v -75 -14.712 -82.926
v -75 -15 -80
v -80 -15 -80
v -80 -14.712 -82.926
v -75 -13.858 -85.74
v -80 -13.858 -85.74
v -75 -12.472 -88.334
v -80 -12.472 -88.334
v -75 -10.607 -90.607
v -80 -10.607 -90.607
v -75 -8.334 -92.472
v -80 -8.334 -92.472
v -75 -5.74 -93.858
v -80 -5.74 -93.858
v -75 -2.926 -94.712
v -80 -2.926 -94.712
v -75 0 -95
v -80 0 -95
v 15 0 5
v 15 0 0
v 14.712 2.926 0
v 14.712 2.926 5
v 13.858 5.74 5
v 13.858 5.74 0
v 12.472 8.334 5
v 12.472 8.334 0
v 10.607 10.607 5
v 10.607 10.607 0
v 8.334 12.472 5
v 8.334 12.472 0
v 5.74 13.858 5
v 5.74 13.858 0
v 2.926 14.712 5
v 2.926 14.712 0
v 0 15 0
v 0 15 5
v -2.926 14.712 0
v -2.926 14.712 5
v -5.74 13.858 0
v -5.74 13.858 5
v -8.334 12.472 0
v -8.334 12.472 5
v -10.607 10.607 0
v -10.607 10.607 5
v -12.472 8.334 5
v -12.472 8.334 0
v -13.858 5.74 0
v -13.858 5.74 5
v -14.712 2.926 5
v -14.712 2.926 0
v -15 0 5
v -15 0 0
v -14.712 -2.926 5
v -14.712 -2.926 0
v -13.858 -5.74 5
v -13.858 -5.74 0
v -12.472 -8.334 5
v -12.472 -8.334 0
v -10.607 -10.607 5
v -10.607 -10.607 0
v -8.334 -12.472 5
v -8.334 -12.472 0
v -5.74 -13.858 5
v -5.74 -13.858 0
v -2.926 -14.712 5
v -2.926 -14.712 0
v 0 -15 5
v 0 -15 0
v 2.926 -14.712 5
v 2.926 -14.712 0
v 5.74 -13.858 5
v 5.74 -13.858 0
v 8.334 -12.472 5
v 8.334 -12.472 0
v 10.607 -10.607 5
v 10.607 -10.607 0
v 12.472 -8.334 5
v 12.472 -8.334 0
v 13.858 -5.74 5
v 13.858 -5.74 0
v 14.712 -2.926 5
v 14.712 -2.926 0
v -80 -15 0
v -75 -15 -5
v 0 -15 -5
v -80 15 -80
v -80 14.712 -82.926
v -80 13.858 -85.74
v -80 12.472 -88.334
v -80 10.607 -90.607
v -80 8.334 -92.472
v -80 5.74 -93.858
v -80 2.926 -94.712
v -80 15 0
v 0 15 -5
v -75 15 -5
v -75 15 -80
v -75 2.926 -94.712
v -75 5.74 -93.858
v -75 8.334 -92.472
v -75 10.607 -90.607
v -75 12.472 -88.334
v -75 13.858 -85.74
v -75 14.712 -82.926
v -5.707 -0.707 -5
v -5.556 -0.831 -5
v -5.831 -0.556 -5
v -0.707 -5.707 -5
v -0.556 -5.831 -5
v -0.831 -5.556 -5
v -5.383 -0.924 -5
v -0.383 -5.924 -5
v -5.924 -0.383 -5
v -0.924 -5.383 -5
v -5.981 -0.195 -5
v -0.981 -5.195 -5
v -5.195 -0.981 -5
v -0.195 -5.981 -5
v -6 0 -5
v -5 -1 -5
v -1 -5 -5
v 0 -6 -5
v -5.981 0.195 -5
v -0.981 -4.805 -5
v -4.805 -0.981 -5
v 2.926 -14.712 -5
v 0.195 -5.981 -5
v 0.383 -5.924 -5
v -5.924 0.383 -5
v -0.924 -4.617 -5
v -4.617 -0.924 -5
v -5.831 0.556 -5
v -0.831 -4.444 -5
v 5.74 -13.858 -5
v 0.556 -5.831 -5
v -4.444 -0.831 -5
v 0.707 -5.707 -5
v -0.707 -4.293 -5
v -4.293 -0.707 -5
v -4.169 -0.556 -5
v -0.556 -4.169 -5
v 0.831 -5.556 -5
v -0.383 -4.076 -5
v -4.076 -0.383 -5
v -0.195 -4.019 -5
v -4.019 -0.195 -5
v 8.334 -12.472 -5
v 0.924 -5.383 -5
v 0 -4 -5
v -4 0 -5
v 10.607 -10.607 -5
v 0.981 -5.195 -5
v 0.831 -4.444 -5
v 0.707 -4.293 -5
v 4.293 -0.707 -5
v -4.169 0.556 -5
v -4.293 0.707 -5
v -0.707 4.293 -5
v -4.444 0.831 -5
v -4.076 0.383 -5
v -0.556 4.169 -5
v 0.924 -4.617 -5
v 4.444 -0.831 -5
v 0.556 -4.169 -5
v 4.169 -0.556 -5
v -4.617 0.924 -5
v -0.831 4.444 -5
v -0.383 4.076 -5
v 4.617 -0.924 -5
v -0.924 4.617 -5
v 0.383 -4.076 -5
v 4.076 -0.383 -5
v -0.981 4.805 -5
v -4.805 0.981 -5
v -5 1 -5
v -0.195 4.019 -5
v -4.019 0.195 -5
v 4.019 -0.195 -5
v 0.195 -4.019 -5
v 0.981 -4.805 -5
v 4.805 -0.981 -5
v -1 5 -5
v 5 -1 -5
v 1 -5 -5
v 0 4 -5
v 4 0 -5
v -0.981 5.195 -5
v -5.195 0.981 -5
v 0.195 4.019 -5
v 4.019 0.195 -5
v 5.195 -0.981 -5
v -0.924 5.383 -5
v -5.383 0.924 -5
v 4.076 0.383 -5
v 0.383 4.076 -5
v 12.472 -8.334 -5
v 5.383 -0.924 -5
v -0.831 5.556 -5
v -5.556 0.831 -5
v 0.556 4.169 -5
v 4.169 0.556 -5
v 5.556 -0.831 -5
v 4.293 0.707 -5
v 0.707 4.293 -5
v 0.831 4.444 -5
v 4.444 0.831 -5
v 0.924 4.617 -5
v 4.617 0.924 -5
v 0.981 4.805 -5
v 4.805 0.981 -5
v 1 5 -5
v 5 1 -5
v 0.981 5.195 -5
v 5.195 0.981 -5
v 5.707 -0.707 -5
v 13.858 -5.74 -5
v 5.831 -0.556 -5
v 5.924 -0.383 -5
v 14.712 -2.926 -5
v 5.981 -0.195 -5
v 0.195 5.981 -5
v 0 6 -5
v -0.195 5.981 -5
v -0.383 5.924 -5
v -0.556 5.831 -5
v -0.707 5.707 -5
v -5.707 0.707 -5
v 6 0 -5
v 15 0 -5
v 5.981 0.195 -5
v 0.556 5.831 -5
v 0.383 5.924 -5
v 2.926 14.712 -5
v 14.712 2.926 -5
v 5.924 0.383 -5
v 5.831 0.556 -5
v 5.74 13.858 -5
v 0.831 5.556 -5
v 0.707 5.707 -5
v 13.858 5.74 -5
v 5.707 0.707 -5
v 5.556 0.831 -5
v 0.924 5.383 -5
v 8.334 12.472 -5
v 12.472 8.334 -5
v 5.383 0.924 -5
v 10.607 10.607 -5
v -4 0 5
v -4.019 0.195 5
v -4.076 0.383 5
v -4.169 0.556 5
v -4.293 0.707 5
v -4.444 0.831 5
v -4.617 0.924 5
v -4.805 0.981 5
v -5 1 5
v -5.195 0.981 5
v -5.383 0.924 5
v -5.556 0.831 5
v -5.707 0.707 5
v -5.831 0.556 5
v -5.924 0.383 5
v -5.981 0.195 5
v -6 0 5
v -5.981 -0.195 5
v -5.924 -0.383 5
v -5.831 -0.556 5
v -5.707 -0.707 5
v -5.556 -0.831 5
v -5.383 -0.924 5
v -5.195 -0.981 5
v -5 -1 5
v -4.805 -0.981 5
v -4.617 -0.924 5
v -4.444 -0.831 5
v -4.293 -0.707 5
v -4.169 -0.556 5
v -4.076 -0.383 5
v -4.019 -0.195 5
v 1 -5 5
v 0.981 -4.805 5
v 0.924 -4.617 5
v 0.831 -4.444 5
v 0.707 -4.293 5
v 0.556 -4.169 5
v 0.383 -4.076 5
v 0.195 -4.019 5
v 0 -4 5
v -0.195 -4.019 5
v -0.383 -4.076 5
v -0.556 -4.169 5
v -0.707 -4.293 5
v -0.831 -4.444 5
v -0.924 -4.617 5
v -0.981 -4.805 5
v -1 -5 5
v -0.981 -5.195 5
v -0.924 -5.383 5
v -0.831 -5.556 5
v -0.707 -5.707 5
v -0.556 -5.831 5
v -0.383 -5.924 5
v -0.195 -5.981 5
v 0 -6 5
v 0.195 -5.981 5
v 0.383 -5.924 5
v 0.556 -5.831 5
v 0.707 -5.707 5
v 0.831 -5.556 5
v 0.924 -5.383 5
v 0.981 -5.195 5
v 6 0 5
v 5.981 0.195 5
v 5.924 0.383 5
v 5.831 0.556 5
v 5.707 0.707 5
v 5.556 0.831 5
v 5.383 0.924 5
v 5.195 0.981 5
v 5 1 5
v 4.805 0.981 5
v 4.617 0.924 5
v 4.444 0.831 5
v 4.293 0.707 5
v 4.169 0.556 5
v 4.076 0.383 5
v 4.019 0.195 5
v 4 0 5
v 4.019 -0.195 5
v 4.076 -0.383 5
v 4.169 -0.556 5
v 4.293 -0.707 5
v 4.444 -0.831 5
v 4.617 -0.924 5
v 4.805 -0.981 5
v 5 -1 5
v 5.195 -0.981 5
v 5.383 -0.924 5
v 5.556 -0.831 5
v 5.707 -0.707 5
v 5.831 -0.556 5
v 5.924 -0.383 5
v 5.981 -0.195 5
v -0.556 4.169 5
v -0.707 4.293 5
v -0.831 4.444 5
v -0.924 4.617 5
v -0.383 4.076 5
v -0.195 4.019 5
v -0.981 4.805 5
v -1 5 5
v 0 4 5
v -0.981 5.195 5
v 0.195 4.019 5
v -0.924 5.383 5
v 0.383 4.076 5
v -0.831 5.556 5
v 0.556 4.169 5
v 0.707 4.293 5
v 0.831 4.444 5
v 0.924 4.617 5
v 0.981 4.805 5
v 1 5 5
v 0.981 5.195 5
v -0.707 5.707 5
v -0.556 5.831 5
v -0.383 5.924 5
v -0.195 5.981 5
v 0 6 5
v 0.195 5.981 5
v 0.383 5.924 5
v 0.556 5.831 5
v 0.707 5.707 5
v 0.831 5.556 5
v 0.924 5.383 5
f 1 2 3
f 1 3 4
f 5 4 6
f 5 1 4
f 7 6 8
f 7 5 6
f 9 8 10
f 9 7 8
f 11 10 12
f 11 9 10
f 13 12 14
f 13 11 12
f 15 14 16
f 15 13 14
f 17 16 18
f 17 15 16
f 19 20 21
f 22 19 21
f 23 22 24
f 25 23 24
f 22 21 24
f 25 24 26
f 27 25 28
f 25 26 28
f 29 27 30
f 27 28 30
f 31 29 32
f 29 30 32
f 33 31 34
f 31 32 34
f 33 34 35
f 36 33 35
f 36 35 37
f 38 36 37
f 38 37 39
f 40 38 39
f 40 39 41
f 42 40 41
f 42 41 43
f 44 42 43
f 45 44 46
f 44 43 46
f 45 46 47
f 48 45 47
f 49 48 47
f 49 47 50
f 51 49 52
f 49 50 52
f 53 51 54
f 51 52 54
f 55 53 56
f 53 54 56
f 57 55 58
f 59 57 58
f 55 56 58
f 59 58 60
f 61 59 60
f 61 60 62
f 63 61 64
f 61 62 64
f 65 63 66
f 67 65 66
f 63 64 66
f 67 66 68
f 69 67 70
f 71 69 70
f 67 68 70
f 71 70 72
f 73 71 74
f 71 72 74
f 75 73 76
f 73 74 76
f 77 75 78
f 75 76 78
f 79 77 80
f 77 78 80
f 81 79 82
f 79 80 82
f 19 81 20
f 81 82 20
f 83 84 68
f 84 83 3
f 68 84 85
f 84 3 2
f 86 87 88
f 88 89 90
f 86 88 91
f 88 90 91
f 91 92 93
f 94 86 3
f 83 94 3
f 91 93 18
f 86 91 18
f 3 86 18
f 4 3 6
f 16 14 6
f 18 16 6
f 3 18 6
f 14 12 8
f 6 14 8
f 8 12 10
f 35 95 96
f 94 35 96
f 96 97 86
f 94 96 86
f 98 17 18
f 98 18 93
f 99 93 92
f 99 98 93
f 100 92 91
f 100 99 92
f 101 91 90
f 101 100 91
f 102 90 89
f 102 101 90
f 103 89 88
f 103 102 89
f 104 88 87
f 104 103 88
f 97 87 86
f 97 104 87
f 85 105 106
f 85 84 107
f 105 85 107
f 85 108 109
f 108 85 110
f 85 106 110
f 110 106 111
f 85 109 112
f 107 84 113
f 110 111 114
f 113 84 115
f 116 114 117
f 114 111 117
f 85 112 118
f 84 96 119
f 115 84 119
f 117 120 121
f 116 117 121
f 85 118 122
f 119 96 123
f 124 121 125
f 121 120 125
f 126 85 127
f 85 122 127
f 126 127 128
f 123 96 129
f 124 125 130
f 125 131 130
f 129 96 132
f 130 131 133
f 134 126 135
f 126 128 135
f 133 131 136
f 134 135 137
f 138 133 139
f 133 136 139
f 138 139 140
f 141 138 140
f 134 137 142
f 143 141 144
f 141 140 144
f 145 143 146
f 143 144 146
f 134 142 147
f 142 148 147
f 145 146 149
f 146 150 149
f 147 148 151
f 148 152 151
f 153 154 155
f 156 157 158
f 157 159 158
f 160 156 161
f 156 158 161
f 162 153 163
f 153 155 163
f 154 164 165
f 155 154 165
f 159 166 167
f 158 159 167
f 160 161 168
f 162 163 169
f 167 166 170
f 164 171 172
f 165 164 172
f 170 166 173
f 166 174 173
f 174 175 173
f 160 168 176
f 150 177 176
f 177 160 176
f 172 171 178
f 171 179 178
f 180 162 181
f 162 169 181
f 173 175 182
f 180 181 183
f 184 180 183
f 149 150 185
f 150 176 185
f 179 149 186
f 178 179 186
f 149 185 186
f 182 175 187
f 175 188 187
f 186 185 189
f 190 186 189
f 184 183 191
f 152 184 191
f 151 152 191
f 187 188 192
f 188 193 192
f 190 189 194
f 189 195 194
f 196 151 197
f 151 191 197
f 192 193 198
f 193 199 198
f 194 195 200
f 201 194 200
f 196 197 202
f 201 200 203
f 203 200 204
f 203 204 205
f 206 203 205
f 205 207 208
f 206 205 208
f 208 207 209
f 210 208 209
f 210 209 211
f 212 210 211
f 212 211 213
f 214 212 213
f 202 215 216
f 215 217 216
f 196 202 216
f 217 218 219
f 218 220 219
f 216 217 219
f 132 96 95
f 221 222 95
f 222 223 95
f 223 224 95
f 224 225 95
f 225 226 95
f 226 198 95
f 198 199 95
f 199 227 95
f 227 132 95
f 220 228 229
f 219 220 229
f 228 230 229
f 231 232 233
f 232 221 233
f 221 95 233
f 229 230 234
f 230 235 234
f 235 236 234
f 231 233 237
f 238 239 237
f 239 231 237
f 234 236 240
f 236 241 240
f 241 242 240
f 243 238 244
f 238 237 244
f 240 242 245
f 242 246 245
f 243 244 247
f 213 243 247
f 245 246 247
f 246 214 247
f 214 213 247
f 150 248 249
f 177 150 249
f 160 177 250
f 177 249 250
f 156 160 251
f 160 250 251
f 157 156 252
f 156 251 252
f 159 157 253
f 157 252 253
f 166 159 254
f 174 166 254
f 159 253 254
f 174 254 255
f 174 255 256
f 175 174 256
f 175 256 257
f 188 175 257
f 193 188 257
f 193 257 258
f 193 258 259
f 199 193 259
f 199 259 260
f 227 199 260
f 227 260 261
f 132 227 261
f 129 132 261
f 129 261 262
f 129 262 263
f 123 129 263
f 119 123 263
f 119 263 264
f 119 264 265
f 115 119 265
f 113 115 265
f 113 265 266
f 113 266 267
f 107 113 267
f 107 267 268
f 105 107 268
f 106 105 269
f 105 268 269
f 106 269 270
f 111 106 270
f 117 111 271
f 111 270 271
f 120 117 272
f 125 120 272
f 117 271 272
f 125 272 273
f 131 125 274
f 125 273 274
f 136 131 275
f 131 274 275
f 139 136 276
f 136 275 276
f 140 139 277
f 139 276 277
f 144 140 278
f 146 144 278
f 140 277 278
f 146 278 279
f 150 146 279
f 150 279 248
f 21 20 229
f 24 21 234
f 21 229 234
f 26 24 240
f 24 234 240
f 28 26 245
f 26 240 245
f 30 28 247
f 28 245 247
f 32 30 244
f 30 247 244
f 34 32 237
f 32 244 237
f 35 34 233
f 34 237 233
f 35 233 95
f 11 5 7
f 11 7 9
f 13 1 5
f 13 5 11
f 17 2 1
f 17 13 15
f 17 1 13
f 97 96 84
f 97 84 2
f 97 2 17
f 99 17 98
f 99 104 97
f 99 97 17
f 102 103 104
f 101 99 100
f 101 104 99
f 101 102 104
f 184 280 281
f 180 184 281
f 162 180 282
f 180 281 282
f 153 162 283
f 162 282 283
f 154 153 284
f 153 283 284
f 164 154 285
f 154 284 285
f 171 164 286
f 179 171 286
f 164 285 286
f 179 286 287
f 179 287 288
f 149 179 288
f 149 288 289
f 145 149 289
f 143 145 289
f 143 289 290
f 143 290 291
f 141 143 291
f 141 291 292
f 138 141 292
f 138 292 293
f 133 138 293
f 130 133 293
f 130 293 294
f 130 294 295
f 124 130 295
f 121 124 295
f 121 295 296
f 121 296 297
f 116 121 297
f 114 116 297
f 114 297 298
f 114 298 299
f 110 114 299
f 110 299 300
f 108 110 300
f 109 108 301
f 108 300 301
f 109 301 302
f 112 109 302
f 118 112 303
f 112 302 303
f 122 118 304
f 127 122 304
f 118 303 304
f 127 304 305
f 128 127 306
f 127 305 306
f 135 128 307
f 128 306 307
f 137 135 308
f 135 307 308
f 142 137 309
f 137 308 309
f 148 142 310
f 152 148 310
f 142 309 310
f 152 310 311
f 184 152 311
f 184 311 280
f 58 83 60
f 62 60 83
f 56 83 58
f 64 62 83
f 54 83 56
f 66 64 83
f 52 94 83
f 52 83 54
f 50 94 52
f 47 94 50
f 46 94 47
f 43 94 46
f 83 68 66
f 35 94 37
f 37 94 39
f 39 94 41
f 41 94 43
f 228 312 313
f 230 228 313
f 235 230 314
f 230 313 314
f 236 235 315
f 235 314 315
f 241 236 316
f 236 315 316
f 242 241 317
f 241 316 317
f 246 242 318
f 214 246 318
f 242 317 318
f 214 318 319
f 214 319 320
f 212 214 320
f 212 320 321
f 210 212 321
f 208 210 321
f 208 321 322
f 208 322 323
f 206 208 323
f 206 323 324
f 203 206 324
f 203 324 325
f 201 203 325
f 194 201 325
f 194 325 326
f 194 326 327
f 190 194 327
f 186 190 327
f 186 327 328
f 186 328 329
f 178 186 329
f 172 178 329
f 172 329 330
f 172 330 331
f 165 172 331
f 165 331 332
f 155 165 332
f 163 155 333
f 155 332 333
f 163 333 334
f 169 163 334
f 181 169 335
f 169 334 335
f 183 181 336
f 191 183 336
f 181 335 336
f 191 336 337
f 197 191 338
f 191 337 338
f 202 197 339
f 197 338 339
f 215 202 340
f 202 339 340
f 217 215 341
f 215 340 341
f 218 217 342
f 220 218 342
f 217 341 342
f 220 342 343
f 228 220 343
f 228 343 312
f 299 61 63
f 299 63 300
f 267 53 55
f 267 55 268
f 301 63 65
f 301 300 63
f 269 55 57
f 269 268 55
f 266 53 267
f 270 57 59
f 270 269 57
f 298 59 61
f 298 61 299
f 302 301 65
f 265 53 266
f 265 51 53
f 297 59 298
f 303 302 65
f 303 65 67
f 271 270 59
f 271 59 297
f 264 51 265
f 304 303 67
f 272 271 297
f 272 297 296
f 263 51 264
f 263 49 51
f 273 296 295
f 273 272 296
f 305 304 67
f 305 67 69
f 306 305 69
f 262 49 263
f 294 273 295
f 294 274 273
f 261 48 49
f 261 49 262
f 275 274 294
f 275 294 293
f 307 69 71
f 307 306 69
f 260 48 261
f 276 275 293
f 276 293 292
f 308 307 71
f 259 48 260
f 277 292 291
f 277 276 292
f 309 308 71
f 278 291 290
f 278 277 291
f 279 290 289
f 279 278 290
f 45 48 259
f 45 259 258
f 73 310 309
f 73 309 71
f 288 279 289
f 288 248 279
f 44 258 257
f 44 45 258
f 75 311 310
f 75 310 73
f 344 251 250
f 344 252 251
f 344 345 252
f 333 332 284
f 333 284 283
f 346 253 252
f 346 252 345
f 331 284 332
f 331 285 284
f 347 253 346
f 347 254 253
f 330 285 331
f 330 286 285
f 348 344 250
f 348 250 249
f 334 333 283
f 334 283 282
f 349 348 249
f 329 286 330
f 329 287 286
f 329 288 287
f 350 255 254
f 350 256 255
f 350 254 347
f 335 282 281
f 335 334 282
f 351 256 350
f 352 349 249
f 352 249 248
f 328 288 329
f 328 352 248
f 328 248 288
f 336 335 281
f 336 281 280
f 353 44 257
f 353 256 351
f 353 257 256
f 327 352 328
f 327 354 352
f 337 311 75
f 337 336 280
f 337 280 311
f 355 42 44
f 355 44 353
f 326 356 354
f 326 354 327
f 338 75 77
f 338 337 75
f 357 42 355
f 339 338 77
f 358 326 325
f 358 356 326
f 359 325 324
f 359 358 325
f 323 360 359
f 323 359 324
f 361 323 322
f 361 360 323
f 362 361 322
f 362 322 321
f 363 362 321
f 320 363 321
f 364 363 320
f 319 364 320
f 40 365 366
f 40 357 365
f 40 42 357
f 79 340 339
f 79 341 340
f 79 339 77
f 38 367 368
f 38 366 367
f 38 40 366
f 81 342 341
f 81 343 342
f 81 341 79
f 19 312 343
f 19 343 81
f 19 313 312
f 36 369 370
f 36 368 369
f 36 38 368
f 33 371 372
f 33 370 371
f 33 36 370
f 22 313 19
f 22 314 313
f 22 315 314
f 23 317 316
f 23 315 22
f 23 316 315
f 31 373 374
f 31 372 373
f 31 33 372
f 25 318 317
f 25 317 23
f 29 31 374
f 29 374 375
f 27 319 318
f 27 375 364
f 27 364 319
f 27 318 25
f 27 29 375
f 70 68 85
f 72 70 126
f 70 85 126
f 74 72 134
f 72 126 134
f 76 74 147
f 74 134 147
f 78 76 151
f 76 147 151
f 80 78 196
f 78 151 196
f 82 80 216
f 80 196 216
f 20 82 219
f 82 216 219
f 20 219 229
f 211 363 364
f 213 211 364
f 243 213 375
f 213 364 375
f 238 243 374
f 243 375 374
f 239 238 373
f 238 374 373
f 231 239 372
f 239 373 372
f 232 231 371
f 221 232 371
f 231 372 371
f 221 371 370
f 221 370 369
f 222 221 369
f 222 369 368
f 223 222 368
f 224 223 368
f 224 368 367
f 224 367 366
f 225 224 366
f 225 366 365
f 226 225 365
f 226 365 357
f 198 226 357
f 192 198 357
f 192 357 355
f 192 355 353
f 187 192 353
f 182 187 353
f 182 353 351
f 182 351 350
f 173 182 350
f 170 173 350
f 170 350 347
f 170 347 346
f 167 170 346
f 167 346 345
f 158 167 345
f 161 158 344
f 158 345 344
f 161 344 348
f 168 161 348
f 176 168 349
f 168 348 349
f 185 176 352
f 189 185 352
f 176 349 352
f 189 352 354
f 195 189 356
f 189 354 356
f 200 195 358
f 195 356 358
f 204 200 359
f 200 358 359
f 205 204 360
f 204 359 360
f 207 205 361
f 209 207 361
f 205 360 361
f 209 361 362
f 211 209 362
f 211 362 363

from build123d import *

# Parameters (mm, degrees)
SKETCH1_R           = 15
FACE_2_DEPTH        = 5
L_START             = -5
L_LINK_DEPTH        = 5
SKETCH3_R           = 1
FIXING_SCREWS_DEPTH = 83.006097334


with BuildPart() as part:
    # Sketch1 → face 2 (new body)
    with BuildSketch(Plane.XY):
        Circle(SKETCH1_R)
    extrude(amount=FACE_2_DEPTH)

    # Sketch2 → L link (add)
    with BuildSketch(Plane.XY.offset(L_START)):
        with BuildLine():
            ThreePointArc((0, -15), (-15, 0), (0, 15))
            Line((0, 15), (-80, 15))
            Line((-80, 15), (-80, -15))
            Line((-80, -15), (0, -15))
        make_face()
        with BuildLine():
            ThreePointArc((15, 0), (10.606601718, 10.606601718), (0, 15))
            Line((0, 15), (0, -15))
            ThreePointArc((0, -15), (10.606601718, -10.606601718), (15, 0))
        make_face()
        with BuildLine():
            Line((0, -15), (0, 15))
            ThreePointArc((0, 15), (-15, 0), (0, -15))
        make_face()
    l_link = extrude(amount=L_LINK_DEPTH)

    # Sketch3 → fixing screws (cut, through all)
    with BuildSketch(Plane.XY.offset(5)):
        with Locations((0, 5)):
            Circle(SKETCH3_R)
        with Locations((5, 0)):
            Circle(SKETCH3_R)
        with Locations((0, -5)):
            Circle(SKETCH3_R)
        with Locations((-5, 0)):
            Circle(SKETCH3_R)
    extrude(amount=-FIXING_SCREWS_DEPTH, mode=Mode.SUBTRACT)

    # Mirror2: L link across plane
    add(l_link.mirror(Plane(origin=(-40, 0, -40), x_dir=(-0.7071067811865478, 0, 0.7071067811865472), z_dir=(0.7071067811865475, 0, 0.7071067811865477))))


solid = part.part
